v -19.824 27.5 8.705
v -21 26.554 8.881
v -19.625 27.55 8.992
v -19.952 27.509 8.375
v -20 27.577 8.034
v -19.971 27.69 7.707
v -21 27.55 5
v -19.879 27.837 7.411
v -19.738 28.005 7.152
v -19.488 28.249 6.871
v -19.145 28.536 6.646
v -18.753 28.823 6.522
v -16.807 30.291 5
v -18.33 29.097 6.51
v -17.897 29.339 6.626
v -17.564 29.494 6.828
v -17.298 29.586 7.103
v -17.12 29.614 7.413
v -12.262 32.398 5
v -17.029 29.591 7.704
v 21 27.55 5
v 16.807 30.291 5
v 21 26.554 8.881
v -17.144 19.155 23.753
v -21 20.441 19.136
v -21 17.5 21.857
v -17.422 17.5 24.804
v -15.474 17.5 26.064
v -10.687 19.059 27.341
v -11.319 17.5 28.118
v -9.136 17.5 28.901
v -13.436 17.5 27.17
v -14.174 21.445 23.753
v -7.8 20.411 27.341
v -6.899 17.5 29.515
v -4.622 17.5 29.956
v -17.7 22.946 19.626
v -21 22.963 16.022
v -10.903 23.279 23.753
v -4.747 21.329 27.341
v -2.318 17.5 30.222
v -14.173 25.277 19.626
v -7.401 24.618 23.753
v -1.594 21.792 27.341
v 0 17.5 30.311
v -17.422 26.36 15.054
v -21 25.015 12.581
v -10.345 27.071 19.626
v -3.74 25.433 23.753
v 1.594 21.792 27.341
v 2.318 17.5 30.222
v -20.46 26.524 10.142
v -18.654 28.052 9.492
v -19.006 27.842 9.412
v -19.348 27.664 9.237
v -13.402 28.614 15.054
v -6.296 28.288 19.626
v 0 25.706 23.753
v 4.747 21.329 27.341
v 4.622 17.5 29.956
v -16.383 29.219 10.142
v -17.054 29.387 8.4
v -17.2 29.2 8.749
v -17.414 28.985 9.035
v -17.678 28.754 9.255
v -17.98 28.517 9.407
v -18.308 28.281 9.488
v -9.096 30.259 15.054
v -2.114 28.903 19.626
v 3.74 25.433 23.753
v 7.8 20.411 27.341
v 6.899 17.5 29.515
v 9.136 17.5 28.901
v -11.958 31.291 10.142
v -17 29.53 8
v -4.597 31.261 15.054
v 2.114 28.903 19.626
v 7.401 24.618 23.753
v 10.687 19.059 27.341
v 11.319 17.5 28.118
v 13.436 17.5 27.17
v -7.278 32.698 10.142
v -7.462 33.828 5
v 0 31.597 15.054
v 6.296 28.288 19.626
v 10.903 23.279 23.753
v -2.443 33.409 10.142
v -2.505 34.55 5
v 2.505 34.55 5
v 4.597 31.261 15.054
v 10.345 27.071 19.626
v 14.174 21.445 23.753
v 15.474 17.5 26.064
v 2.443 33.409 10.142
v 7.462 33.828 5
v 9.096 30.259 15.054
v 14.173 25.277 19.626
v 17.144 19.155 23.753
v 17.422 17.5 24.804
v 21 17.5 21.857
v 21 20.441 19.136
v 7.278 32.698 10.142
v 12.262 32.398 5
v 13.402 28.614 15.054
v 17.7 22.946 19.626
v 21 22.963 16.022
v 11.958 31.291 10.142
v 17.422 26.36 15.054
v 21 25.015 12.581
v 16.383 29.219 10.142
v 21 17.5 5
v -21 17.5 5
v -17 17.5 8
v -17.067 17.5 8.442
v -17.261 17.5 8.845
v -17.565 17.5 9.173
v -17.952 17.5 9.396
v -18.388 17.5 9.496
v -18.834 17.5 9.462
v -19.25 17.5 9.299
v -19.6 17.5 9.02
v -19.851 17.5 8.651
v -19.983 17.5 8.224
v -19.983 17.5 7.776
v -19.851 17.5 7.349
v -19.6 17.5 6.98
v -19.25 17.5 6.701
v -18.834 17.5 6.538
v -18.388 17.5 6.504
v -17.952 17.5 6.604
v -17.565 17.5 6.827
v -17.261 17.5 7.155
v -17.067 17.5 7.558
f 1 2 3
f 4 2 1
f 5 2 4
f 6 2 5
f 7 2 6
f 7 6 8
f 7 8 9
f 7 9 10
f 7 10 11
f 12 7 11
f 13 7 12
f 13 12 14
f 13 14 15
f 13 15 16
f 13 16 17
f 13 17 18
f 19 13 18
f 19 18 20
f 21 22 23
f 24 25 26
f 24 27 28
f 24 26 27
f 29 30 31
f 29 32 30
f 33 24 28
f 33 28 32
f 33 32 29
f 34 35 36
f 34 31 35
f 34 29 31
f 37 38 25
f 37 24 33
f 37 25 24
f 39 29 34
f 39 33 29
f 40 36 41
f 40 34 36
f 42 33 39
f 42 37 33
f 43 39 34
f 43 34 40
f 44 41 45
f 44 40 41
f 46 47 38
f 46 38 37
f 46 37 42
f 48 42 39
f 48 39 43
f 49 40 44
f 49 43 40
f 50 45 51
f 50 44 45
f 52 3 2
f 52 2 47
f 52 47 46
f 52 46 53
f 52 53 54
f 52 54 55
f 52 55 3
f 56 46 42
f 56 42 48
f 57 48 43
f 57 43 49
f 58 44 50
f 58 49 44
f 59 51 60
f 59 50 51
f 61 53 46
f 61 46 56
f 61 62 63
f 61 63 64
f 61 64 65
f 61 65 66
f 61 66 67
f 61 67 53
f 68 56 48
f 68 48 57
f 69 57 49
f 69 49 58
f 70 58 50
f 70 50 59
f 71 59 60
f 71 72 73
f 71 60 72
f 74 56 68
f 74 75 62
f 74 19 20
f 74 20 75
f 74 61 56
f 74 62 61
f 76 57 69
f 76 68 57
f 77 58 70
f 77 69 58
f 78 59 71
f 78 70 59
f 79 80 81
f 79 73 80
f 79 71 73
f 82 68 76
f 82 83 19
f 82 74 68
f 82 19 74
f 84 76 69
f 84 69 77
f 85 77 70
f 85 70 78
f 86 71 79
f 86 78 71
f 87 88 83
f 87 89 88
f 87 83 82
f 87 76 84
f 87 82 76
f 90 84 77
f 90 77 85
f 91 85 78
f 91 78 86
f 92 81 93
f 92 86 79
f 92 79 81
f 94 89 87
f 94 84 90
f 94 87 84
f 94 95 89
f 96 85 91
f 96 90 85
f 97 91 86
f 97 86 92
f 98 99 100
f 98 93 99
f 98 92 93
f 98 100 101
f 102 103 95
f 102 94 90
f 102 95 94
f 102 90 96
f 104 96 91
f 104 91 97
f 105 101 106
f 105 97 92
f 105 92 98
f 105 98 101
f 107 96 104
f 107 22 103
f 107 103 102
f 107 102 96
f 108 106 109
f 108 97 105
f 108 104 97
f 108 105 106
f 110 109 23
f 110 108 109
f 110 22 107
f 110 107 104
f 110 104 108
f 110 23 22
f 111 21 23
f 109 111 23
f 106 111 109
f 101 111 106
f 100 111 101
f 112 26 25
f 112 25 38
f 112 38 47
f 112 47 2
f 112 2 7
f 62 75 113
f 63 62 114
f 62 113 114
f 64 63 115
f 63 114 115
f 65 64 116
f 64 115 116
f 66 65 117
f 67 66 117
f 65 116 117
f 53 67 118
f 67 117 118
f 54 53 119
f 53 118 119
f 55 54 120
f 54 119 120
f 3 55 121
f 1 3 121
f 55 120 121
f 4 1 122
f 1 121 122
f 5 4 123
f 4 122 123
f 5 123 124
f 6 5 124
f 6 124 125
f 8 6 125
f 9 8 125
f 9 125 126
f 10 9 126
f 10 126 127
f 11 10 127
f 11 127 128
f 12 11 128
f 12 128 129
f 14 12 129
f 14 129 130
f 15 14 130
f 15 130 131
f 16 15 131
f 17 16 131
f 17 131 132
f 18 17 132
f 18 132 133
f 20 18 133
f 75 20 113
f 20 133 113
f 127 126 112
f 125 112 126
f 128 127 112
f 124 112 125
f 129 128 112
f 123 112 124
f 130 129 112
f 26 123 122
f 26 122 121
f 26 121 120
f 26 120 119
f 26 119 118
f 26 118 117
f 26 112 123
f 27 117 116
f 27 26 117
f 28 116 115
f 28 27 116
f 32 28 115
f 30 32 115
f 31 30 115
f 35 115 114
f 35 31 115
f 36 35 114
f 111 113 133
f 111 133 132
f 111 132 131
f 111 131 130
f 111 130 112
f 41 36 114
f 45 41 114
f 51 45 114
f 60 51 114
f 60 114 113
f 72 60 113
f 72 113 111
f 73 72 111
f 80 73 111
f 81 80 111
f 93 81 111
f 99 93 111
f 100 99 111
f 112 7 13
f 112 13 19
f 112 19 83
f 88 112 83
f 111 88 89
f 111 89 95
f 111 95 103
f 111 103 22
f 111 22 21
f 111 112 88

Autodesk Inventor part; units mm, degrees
ref_plane "YZ Plane" through (0, 0, 0) normal (1, 0, 0) x (0, 1, 0)
ref_plane "XZ Plane" through (0, 0, 0) normal (0, 1, 0) x (-1, 0, 0)
ref_plane "XY Plane" through (0, 0, 0) normal (0, 0, 1) x (1, 0, 0)
sketch "スケッチ1" plane through (0, 0, 0) normal (0, 1, 0) x (-1, 0, 0)
  circle A0 centre (0, 0) radius 35
  line L0 (0, 0) -> (0, -35)
  line L1 (0, 0) -> (0, 35)
  dimension "d0" = 70
revolve "回転1" add sketch "スケッチ1" angle 180 about axis through (0, 0, 0) along (0, 0, 1) picked at (-2.5961, -23.0408) contours L1 L0 A0
sketch "スケッチ5" plane through (0, 0, 0) normal (0, -1, 0) x (1, 0, 0)
  line L0 (-20, -22) -> (20, -22)
  line L1 (20, -22) -> (20, -13)
  line L2 (20, -13) -> (-20, -13)
  line L3 (-20, -13) -> (-20, -22)
  line L4 (-20, -15) -> (-20, -13)
  line L5 (0, 25) -> (-17, 25)
  line L6 (-17, 25) -> (-17, 23)
  line L7 (-17, 23) -> (0, 23)
  line L8 (0, 23) -> (0, 25)
  line L9 (0, 20) -> (-20, 20)
  line L10 (-20, 20) -> (-20, 19)
  line L11 (-20, 19) -> (0, 19)
  line L12 (0, 19) -> (0, 20)
  line L13 (0, 13) -> (-19, 13)
  line L14 (-19, 13) -> (-19, 11)
  line L15 (-19, 11) -> (0, 11)
  line L16 (0, 11) -> (0, 13)
  line L17 (0, 5) -> (-23, 5)
  line L18 (-23, 5) -> (-23, 3)
  line L19 (-23, 3) -> (0, 3)
  line L20 (0, 3) -> (0, 5)
  circle A0 centre (0, 0) radius 35 projected
  circle A1 centre (0, 0) radius 35 projected
  line L21 (0, 35) -> (0, -35)
  line L22 (35, 0) -> (-35, 0)
  line L23 (-32, 2) -> (-23, 2)
  line L24 (-23, 2) -> (-23, -8)
  line L25 (-23, -8) -> (-32, -8)
  line L26 (-32, -8) -> (-32, 2)
  line L27 (-23, -8.0262) -> (-23, 2)
  line L28 (-27, 22.2711) -> (-27, -22.2711)
  line L29 (-15.5, 25) -> (0, 25)
  line L30 (0, 25) -> (0, 35)
  line L31 (0, 35) -> (-15.5, 35)
  line L32 (-15.5, 35) -> (-15.5, 25)
  line L33 (-15.5, 23) -> (0, 23)
  line L34 (0, 23) -> (0, 20)
  line L35 (0, 20) -> (-15.5, 20)
  line L36 (-15.5, 20) -> (-15.5, 23)
  line L37 (-16, 13) -> (0, 13)
  line L38 (0, 13) -> (0, 19)
  line L39 (0, 19) -> (-16, 19)
  line L40 (-16, 19) -> (-16, 13)
  line L41 (-16, 11) -> (0, 11)
  line L42 (0, 11) -> (0, 5)
  line L43 (0, 5) -> (-16, 5)
  line L44 (-16, 5) -> (-16, 11)
  line L45 (-23, -3) -> (-39.6865, -3)
  line L46 (-23, -3) -> (-7.8337, -3)
  line L47 (-8, 3) -> (-23, 3)
  line L48 (-23, 3) -> (-23, -9)
  line L49 (-23, -9) -> (-8, -9)
  line L50 (-8, -9) -> (-8, 3)
  line L51 (-8, 3) -> (-23, -9) construction
  line L52 (-23, 3) -> (-8, -9) construction
  line L53 (-23, 4) -> (-33, 4)
  line L54 (-33, 4) -> (-33, -10)
  line L55 (-33, -10) -> (-23, -10)
  line L56 (-23, -10) -> (-23, 4)
  line L57 (-23, 4) -> (-33, -10) construction
  line L58 (-33, 4) -> (-23, -10) construction
  line L59 (-8, 3) -> (-1, 3)
  line L60 (-1, 3) -> (-1, -9)
  line L61 (-1, -9) -> (-8, -9)
  line L62 (-8, -9) -> (-8, 3)
  line L63 (-8, 3) -> (-1, -9) construction
  line L64 (-1, 3) -> (-8, -9) construction
  line L65 (-23, 2) -> (-27, 2)
  line L66 (-23, -8) -> (-27, -8)
  line L67 (-23, 4) -> (-27, 4)
  line L68 (-23, -10) -> (-27, -10)
  line L69 (23.4307, -26) -> (-23.4307, -26)
  line L70 (-8, 3) -> (-6.8, 3)
  line L71 (-6.8, 3) -> (-6.8, -9)
  line L72 (-6.8, -9) -> (-8, -9)
  line L73 (-8, -9) -> (-8, 3)
  line L74 (-3, 5) -> (0, 5)
  line L75 (0, 20) -> (-4, 20)
  line L76 (-4, 19) -> (0, 19)
  line L77 (0, 19) -> (0, 20)
  line L78 (-6, 5) -> (-1, 5)
  line L79 (-1, 3) -> (-6, 3)
  point P0 (0, -22)
  point P1 (0, -13)
  point P2 (0, 24)
  point P3 (0, 19.5)
  point P4 (0, 12)
  point P5 (0, 4)
  point P6 (-20, -17.5)
  point P7 (-27, -0.5262)
  point P8 (-27, -8)
  point P9 (-15.5, 21.5)
  point P10 (-15.5, 31.3807)
  point P11 (0, 25)
  point P12 (0, 23)
  point P13 (0, 11)
  point P14 (0, 13)
  point P15 (-27, 0)
  point P16 (-32, 0)
  point P17 (-23, 0)
  point P18 (-15.5, -3)
  point P19 (-28, -3)
  point P20 (-4.5, -3)
  point P21 (-8, -9)
  point P22 (-8, 3)
  point P23 (-27, 0.5)
  point P24 (-28, 0.4738)
  point P25 (-28, -11.5262)
  point P26 (-27, -11.5)
  point P27 (-23, 2)
  point P28 (-23, 2)
  point P29 (-8, 0)
  point P30 (-1, 0)
  point P31 (0, 19)
  point P32 (0, 20)
  point P33 (-27, -10)
  point P34 (-27, 4)
  dimension "d12" = 40
  dimension "d13" = 9
  dimension "d23" = 17
  dimension "d24" = 2
  dimension "d27" = 20
  dimension "d28" = 1
  dimension "d30" = 19
  dimension "d31" = 2
  dimension "d33" = 2
  dimension "d88" = 0
  dimension "d89" = 0
  dimension "d90" = 13
  dimension "d92" = 20
  dimension "d93" = 10
  dimension "d97" = 9
  dimension "d98" = 10
  dimension "d113" = 27
  dimension "d122" = 15.5
  dimension "d123" = 35
  dimension "d124" = 3
  dimension "d125" = 15.5
  dimension "d126" = 6
  dimension "d127" = 6
  dimension "d128" = 16
  dimension "d129" = 16
  dimension "d147" = 12
  dimension "d149" = 8
  dimension "d151" = 15
  dimension "d161" = 14
  dimension "d162" = 10
  dimension "d164" = 12
  dimension "d165" = 7
  dimension "d170" = 26
  dimension "d175" = 1.2
  dimension "d207" = 0
extrude "GNSボード" cut sketch "スケッチ5" against normal blind 16 contours L8 L7 L6 L5
extrude "GNSボード止めるよう" cut sketch "スケッチ5" against normal blind 15 contours L21 L5 L32 A0 | L21 L9 L36 L7
extrude "アルミ板１" cut sketch "スケッチ5" against normal blind 17.5 contours L11 L10 L9 L12
extrude "メイン基板" cut sketch "スケッチ5" against normal blind 17.5 contours L15 L14 L13 L16
extrude "メイン止めるよう" cut sketch "スケッチ5" against normal blind 16.5 contours L17 L44 L15 L21 | L13 L40 L11 L21
extrude "アルミ板２" cut sketch "スケッチ5" against normal blind 19 contours L19 L18 L17 L20
extrude "電池ボックス入れ" cut sketch "スケッチ5" against normal blind 15 contours L3 L2 L21 L0 | L21 L2 L1 L0
extrude "side ut" cut sketch "スケッチ5" against normal blind 100 contours A0 L45 L54 L55 L28 | A0 L22 L54 L45 | L55 L54 L45 L26 L25 L28 | A0 L28 L53 L54 L22 | L54 L22 L26 L45 | L25 L26 L45 L28 | L54 L53 L28 L23 L26 L22 | L26 L22 L28 L45 | L22 L26 L23 L28
extrude "motor case" add sketch "スケッチ5" against normal blind 7 contours L55 L54 L45 L26 L25 L28 | L28 L25 L27 L48 L56 L55 | L50 L46 L24 L22 | L22 L24 L48 L19 L50 | L54 L22 L26 L45 | L28 L45 L24 L25 | L25 L26 L45 L28 | L24 L45 L28 L22 | L22 L28 L23 L24 | L50 L49 L48 L27 L24 L46 | L54 L53 L28 L23 L26 L22 | L26 L22 L28 L45 | L53 L18 L48 L23 L28 | L22 L26 L23 L28
extrude "bottom cut" cut sketch "スケッチ5" against normal blind 90 contours L69 A0 L21 | L21 A0 L69
extrude "motor" cut sketch "スケッチ5" against normal blind 6 contours L60 L61 L71 L22 | L22 L71 L19 L60 | L71 L61 L50 L22 | L22 L50 L19 L71 | L50 L46 L24 L22 | L22 L24 L48 L19 L50 | L28 L45 L24 L25 | L25 L26 L45 L28 | L24 L45 L28 L22 | L22 L28 L23 L24 | L50 L49 L48 L27 L24 L46 | L26 L22 L28 L45 | L22 L26 L23 L28
extrude "motor block" add sketch "スケッチ5" against normal blind 10 contours L71 L61 L50 L22 | L22 L50 L19 L71
sketch "スケッチ27" plane through (-33, 0, -10) normal (-1, 0, 0) x (0, 0, 1)
  line L0 (14, 0) -> (0, 0) projected
  circle A0 centre (7, 0) radius 3
  point P0 (10, 0)
  dimension "d198" = 6
extrude "押し出し36" cut sketch "スケッチ27" against normal blind 27
mirror "ミラー13" about plane through (0, 0, 0) normal (1, 0, 0) of "メイン止めるよう", "メイン基板", "アルミ板１", "GNSボード止めるよう", "GNSボード", "アルミ板２", "motor", "motor case", "押し出し36", "電池ボックス入れ", "side ut"
ref_plane "作業平面5" through (-17, 17.5, 23) normal (0, -1, 0) x (1, 0, 0)
sketch "スケッチ29" plane through (-17, 17.5, 23) normal (0, -1, 0) x (1, 0, 0)
  line L0 (32.5, 2) -> (1.5, 2) projected
  line L1 (1.5, 0) -> (32.5, 0) projected
  line L2 (32.5, -3) -> (1.5, -3) projected
  line L3 (1, -4) -> (33, -4) projected
  line L4 (33, -10) -> (1, -10) projected
  line L5 (33, -10) -> (33, -4) projected
  line L6 (1, -4) -> (33, -4) projected
  line L7 (1, -10) -> (1, -4) projected
  line L8 (1, -12) -> (33, -12) projected
  line L9 (33, -18) -> (1, -18) projected
  line L10 (33, -18) -> (33, -12) projected
  line L11 (1, -12) -> (33, -12) projected
  line L12 (1, -18) -> (1, -12) projected
  line L13 (18, -20) -> (40, -20) projected
  line L14 (-6, -20) -> (17, -20) projected
  line L15 (17, -18) -> (-6, -18) projected
  line L16 (-16, -23) -> (-15, -23) projected
  line L17 (-15, -23) -> (-15, -21) projected
  line L18 (-15, -21) -> (-6, -21) projected
  line L19 (-6, -21) -> (-6, -18) projected
  line L20 (-6, -18) -> (1, -18) projected
  line L21 (1, -18) -> (1, -12) projected
  line L22 (1, -12) -> (-2, -12) projected
  line L23 (-2, -12) -> (-2, -10) projected
  line L24 (-2, -10) -> (1, -10) projected
  line L25 (1, -10) -> (1, -4) projected
  line L26 (1, -4) -> (-3, -4) projected
  line L27 (-3, -4) -> (-3, -3) projected
  line L28 (-3, -3) -> (1.5, -3) projected
  line L29 (1.5, -3) -> (1.5, 0) projected
  line L30 (1.5, 0) -> (0, 0) projected
  line L31 (0, 0) -> (0, 2) projected
  line L32 (0, 2) -> (1.5, 2) projected
  line L33 (1.5, 2) -> (1.5, 8.3807) projected
  arc A0 (1.5, 8.3807) -> (-10, -0.7289) centre (17, -23) ccw projected
  line L34 (-10, -0.7289) -> (-10, -19) projected
  line L35 (-10, -19) -> (-16, -19) projected
  line L36 (-16, -19) -> (-16, -23) projected
  line L37 (49, -23) -> (50, -23) projected
  line L38 (50, -19) -> (50, -23) projected
  line L39 (44, -19) -> (50, -19) projected
  line L40 (44, -19) -> (44, -0.7289) projected
  arc A1 (44, -0.7289) -> (32.5, 8.3807) centre (17, -23) ccw projected
  line L41 (32.5, 8.3807) -> (32.5, 2) projected
  line L42 (32.5, 2) -> (34, 2) projected
  line L43 (34, 2) -> (34, 0) projected
  line L44 (34, 0) -> (32.5, 0) projected
  line L45 (32.5, 0) -> (32.5, -3) projected
  line L46 (32.5, -3) -> (37, -3) projected
  line L47 (37, -3) -> (37, -4) projected
  line L48 (37, -4) -> (33, -4) projected
  line L49 (33, -4) -> (33, -10) projected
  line L50 (33, -10) -> (36, -10) projected
  line L51 (36, -10) -> (36, -12) projected
  line L52 (36, -12) -> (33, -12) projected
  line L53 (33, -12) -> (33, -18) projected
  line L54 (33, -18) -> (40, -18) projected
  line L55 (40, -18) -> (40, -21) projected
  line L56 (40, -21) -> (49, -21) projected
  line L57 (49, -21) -> (49, -23) projected
  line L58 (40, -18) -> (-6, -18) projected
  line L59 (-4, -18) -> (38, -18)
  line L60 (38, -18) -> (38, 8.3807)
  line L61 (38, 8.3807) -> (-4, 8.3807)
  line L62 (-4, 8.3807) -> (-4, -18)
  circle A2 centre (17, -23) radius 35
  point P0 (-10, -0.7289)
  point P1 (44, -0.7289)
  point P2 (-4, 5)
  point P3 (38, 5)
  point P4 (37, -3)
  point P5 (38, -18)
  point P6 (32.5, 8.3807)
  point P7 (32.5, 8.3807)
  point P8 (1.5, 8.3807)
  point P9 (1.5, 8.3807)
  dimension "d209" = 2
  dimension "d210" = 2
  dimension "d211" = 26.3807
  dimension "d212" = 70
extrude "押し出し38" cut sketch "スケッチ29" against normal blind 30 contours A1 L40 L39 L38 L37 L57 L56 L55 L54 L60 | L62 L15 L19 L18 L17 L16 L36 L35 L34 A0 | A2 L34 L35 L36 L16 L17 L18 L19 L15 L9 L54 L55 L56 L57 L37 L38 L39 L40
sketch "スケッチ30" plane through (-17, 17.5, 23) normal (0, -1, 0) x (1, 0, 0)
  circle A0 centre (17, -23) radius 50
  line L0 (17, 2) -> (0, 2) projected
  line L1 (0, 0) -> (17, 0) projected
  line L2 (-16, -23) -> (-15, -23) projected
  line L3 (-15, -23) -> (-15, -21) projected
  line L4 (-15, -21) -> (-6, -21) projected
  line L5 (-6, -21) -> (-6, -18) projected
  line L6 (-6, -18) -> (1, -18) projected
  line L7 (1, -18) -> (1, -12) projected
  line L8 (1, -12) -> (-2, -12) projected
  line L9 (-2, -12) -> (-2, -10) projected
  line L10 (-2, -10) -> (1, -10) projected
  line L11 (1, -10) -> (1, -4) projected
  line L12 (1, -4) -> (-3, -4) projected
  line L13 (-3, -4) -> (-3, -3) projected
  line L14 (-3, -3) -> (1.5, -3) projected
  line L15 (1.5, -3) -> (1.5, 0) projected
  line L16 (1.5, 0) -> (0, 0) projected
  line L17 (0, 0) -> (0, 2) projected
  line L18 (0, 2) -> (1.5, 2) projected
  line L19 (1.5, 2) -> (1.5, 8.3807) projected
  arc A1 (1.5, 8.3807) -> (-10, -0.7289) centre (17, -23) ccw projected
  line L20 (-10, -0.7289) -> (-10, -19) projected
  line L21 (-10, -19) -> (-16, -19) projected
  line L22 (-16, -19) -> (-16, -23) projected
  line L23 (-4, -18) -> (-4, -1.1425) projected
  dimension "d215" = 100
  dimension "d218" = 5
extrude "押し出し39" cut sketch "スケッチ30" along normal blind 100 contours A0 | L0 L17 L1 L15 L14 L13 L12 L11 L10 L9 L8 L7 L6 L5 L4 L3 L2 L22 L21 L20 A1 L19
sketch "スケッチ31" plane through (0, 17.5, 0) normal (0, -1, 0) x (1, 0, 0)
  line L0 (-16, 5) -> (-16, 11) projected
  line L1 (-19, 11) -> (0, 11) projected
  line L2 (-19, 13) -> (-19, 11) projected
  line L3 (0, 13) -> (-19, 13) projected
  line L4 (-16, 19) -> (-16, 13) projected
  line L5 (-20, 19) -> (0, 19) projected
  line L6 (0, 20) -> (-20, 20) projected
  line L7 (-16, 11) -> (-21, 5)
  line L8 (-21, 5) -> (-16, 5)
  line L9 (21, 5) -> (-21, 5) projected
  line L10 (-21, 5) -> (-21, 21.8575) projected
  line L11 (-21, 11) -> (-16, 5)
  line L12 (-16, 11) -> (-21, 11)
  circle A0 centre (-18.5, 8) radius 1.5
  point P0 (0, 0)
  dimension "d219" = 3
extrude "押し出し40" cut sketch "スケッチ31" against normal blind 100 contours A0 L7 L11 | L11 L7 A0 | L7 L11 A0 | A0 L11 L7
properties part number "body back for main 2" material "ABS プラスチック"
